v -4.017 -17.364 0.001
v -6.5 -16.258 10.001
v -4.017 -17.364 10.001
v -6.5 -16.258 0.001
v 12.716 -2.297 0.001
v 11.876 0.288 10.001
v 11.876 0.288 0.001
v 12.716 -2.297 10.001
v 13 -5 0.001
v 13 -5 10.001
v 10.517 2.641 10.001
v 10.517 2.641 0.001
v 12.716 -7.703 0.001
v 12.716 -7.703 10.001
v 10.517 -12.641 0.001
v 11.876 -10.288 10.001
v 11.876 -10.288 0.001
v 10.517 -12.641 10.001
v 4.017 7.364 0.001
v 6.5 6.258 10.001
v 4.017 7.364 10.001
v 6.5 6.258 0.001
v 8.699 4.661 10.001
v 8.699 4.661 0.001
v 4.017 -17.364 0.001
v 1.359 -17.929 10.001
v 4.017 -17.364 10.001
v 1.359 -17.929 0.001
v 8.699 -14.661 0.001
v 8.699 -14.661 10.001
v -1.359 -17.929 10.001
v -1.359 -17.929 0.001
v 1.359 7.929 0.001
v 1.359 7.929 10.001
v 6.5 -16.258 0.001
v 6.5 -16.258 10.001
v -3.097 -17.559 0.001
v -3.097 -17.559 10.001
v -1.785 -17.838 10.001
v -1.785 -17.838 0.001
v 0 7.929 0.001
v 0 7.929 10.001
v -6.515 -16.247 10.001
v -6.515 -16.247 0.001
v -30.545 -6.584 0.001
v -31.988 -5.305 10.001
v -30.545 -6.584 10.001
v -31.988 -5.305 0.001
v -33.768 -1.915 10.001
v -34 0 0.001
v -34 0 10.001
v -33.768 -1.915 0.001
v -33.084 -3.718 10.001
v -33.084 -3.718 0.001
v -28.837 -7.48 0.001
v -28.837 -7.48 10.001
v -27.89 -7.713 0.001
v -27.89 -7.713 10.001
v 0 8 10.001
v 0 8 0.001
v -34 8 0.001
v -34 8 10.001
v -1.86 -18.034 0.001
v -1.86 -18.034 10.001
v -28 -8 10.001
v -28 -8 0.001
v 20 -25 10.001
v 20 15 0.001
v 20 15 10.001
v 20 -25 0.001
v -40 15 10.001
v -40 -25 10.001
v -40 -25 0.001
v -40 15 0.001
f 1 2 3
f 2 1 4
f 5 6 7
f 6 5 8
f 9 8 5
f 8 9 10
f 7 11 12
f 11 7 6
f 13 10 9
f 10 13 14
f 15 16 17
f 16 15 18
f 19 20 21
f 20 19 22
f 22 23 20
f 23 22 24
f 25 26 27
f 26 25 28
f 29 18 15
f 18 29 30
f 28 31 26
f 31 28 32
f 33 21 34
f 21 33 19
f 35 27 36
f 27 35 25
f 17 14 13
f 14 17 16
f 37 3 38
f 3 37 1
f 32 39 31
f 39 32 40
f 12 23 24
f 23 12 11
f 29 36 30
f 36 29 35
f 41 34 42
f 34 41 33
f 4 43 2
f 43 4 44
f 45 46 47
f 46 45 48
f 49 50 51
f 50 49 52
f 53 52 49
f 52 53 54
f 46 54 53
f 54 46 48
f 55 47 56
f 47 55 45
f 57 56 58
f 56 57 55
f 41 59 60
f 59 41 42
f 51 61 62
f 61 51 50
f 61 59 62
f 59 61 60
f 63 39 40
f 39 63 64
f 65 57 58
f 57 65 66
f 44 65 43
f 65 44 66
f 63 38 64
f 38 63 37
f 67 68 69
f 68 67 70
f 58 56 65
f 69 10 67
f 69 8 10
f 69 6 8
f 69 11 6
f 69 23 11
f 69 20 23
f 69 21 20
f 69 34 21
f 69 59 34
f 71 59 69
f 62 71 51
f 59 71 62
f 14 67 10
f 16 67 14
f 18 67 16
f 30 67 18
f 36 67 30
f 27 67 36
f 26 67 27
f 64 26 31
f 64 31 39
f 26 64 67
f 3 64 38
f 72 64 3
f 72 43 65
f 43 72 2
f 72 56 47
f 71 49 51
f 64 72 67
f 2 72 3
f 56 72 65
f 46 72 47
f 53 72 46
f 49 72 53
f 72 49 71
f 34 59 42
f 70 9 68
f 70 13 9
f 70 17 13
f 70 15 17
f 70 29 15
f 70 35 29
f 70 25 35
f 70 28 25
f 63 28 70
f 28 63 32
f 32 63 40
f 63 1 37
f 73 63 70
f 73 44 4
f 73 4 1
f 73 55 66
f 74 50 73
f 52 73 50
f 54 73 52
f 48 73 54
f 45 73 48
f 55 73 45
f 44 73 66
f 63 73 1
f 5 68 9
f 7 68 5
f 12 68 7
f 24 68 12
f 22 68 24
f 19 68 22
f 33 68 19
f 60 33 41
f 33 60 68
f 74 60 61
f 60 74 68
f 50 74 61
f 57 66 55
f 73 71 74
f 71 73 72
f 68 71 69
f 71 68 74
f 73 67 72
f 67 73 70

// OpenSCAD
// Model of Belkin USB hub F4U039
hubLen=150;

module f4u039(hubLen) {
  union() {
    // Wide end
    translate([0, -5, 0]) cylinder(hubLen, r=13);
    // Narrow end
    translate([-26, 0, 0]) cylinder(hubLen, r=8);
    // Flat top
    translate([-34, 0, 0]) cube([34, 8, hubLen]);
    // Fill center
    translate([-26, -8, 0]) cube([26, 8, hubLen]);
    // Add botton angle cube ?
    translate([-28, -8, 0]) rotate([0, 0, -21]) cube([28, 8, hubLen]);
  }
}

// Model F4U041
// Same but more distance between cylinders

// Then print a short piece and check

difference() {
    translate([-40, -25, 0.001]) cube([60, 40, 10]);
    f4u039(150);
}
